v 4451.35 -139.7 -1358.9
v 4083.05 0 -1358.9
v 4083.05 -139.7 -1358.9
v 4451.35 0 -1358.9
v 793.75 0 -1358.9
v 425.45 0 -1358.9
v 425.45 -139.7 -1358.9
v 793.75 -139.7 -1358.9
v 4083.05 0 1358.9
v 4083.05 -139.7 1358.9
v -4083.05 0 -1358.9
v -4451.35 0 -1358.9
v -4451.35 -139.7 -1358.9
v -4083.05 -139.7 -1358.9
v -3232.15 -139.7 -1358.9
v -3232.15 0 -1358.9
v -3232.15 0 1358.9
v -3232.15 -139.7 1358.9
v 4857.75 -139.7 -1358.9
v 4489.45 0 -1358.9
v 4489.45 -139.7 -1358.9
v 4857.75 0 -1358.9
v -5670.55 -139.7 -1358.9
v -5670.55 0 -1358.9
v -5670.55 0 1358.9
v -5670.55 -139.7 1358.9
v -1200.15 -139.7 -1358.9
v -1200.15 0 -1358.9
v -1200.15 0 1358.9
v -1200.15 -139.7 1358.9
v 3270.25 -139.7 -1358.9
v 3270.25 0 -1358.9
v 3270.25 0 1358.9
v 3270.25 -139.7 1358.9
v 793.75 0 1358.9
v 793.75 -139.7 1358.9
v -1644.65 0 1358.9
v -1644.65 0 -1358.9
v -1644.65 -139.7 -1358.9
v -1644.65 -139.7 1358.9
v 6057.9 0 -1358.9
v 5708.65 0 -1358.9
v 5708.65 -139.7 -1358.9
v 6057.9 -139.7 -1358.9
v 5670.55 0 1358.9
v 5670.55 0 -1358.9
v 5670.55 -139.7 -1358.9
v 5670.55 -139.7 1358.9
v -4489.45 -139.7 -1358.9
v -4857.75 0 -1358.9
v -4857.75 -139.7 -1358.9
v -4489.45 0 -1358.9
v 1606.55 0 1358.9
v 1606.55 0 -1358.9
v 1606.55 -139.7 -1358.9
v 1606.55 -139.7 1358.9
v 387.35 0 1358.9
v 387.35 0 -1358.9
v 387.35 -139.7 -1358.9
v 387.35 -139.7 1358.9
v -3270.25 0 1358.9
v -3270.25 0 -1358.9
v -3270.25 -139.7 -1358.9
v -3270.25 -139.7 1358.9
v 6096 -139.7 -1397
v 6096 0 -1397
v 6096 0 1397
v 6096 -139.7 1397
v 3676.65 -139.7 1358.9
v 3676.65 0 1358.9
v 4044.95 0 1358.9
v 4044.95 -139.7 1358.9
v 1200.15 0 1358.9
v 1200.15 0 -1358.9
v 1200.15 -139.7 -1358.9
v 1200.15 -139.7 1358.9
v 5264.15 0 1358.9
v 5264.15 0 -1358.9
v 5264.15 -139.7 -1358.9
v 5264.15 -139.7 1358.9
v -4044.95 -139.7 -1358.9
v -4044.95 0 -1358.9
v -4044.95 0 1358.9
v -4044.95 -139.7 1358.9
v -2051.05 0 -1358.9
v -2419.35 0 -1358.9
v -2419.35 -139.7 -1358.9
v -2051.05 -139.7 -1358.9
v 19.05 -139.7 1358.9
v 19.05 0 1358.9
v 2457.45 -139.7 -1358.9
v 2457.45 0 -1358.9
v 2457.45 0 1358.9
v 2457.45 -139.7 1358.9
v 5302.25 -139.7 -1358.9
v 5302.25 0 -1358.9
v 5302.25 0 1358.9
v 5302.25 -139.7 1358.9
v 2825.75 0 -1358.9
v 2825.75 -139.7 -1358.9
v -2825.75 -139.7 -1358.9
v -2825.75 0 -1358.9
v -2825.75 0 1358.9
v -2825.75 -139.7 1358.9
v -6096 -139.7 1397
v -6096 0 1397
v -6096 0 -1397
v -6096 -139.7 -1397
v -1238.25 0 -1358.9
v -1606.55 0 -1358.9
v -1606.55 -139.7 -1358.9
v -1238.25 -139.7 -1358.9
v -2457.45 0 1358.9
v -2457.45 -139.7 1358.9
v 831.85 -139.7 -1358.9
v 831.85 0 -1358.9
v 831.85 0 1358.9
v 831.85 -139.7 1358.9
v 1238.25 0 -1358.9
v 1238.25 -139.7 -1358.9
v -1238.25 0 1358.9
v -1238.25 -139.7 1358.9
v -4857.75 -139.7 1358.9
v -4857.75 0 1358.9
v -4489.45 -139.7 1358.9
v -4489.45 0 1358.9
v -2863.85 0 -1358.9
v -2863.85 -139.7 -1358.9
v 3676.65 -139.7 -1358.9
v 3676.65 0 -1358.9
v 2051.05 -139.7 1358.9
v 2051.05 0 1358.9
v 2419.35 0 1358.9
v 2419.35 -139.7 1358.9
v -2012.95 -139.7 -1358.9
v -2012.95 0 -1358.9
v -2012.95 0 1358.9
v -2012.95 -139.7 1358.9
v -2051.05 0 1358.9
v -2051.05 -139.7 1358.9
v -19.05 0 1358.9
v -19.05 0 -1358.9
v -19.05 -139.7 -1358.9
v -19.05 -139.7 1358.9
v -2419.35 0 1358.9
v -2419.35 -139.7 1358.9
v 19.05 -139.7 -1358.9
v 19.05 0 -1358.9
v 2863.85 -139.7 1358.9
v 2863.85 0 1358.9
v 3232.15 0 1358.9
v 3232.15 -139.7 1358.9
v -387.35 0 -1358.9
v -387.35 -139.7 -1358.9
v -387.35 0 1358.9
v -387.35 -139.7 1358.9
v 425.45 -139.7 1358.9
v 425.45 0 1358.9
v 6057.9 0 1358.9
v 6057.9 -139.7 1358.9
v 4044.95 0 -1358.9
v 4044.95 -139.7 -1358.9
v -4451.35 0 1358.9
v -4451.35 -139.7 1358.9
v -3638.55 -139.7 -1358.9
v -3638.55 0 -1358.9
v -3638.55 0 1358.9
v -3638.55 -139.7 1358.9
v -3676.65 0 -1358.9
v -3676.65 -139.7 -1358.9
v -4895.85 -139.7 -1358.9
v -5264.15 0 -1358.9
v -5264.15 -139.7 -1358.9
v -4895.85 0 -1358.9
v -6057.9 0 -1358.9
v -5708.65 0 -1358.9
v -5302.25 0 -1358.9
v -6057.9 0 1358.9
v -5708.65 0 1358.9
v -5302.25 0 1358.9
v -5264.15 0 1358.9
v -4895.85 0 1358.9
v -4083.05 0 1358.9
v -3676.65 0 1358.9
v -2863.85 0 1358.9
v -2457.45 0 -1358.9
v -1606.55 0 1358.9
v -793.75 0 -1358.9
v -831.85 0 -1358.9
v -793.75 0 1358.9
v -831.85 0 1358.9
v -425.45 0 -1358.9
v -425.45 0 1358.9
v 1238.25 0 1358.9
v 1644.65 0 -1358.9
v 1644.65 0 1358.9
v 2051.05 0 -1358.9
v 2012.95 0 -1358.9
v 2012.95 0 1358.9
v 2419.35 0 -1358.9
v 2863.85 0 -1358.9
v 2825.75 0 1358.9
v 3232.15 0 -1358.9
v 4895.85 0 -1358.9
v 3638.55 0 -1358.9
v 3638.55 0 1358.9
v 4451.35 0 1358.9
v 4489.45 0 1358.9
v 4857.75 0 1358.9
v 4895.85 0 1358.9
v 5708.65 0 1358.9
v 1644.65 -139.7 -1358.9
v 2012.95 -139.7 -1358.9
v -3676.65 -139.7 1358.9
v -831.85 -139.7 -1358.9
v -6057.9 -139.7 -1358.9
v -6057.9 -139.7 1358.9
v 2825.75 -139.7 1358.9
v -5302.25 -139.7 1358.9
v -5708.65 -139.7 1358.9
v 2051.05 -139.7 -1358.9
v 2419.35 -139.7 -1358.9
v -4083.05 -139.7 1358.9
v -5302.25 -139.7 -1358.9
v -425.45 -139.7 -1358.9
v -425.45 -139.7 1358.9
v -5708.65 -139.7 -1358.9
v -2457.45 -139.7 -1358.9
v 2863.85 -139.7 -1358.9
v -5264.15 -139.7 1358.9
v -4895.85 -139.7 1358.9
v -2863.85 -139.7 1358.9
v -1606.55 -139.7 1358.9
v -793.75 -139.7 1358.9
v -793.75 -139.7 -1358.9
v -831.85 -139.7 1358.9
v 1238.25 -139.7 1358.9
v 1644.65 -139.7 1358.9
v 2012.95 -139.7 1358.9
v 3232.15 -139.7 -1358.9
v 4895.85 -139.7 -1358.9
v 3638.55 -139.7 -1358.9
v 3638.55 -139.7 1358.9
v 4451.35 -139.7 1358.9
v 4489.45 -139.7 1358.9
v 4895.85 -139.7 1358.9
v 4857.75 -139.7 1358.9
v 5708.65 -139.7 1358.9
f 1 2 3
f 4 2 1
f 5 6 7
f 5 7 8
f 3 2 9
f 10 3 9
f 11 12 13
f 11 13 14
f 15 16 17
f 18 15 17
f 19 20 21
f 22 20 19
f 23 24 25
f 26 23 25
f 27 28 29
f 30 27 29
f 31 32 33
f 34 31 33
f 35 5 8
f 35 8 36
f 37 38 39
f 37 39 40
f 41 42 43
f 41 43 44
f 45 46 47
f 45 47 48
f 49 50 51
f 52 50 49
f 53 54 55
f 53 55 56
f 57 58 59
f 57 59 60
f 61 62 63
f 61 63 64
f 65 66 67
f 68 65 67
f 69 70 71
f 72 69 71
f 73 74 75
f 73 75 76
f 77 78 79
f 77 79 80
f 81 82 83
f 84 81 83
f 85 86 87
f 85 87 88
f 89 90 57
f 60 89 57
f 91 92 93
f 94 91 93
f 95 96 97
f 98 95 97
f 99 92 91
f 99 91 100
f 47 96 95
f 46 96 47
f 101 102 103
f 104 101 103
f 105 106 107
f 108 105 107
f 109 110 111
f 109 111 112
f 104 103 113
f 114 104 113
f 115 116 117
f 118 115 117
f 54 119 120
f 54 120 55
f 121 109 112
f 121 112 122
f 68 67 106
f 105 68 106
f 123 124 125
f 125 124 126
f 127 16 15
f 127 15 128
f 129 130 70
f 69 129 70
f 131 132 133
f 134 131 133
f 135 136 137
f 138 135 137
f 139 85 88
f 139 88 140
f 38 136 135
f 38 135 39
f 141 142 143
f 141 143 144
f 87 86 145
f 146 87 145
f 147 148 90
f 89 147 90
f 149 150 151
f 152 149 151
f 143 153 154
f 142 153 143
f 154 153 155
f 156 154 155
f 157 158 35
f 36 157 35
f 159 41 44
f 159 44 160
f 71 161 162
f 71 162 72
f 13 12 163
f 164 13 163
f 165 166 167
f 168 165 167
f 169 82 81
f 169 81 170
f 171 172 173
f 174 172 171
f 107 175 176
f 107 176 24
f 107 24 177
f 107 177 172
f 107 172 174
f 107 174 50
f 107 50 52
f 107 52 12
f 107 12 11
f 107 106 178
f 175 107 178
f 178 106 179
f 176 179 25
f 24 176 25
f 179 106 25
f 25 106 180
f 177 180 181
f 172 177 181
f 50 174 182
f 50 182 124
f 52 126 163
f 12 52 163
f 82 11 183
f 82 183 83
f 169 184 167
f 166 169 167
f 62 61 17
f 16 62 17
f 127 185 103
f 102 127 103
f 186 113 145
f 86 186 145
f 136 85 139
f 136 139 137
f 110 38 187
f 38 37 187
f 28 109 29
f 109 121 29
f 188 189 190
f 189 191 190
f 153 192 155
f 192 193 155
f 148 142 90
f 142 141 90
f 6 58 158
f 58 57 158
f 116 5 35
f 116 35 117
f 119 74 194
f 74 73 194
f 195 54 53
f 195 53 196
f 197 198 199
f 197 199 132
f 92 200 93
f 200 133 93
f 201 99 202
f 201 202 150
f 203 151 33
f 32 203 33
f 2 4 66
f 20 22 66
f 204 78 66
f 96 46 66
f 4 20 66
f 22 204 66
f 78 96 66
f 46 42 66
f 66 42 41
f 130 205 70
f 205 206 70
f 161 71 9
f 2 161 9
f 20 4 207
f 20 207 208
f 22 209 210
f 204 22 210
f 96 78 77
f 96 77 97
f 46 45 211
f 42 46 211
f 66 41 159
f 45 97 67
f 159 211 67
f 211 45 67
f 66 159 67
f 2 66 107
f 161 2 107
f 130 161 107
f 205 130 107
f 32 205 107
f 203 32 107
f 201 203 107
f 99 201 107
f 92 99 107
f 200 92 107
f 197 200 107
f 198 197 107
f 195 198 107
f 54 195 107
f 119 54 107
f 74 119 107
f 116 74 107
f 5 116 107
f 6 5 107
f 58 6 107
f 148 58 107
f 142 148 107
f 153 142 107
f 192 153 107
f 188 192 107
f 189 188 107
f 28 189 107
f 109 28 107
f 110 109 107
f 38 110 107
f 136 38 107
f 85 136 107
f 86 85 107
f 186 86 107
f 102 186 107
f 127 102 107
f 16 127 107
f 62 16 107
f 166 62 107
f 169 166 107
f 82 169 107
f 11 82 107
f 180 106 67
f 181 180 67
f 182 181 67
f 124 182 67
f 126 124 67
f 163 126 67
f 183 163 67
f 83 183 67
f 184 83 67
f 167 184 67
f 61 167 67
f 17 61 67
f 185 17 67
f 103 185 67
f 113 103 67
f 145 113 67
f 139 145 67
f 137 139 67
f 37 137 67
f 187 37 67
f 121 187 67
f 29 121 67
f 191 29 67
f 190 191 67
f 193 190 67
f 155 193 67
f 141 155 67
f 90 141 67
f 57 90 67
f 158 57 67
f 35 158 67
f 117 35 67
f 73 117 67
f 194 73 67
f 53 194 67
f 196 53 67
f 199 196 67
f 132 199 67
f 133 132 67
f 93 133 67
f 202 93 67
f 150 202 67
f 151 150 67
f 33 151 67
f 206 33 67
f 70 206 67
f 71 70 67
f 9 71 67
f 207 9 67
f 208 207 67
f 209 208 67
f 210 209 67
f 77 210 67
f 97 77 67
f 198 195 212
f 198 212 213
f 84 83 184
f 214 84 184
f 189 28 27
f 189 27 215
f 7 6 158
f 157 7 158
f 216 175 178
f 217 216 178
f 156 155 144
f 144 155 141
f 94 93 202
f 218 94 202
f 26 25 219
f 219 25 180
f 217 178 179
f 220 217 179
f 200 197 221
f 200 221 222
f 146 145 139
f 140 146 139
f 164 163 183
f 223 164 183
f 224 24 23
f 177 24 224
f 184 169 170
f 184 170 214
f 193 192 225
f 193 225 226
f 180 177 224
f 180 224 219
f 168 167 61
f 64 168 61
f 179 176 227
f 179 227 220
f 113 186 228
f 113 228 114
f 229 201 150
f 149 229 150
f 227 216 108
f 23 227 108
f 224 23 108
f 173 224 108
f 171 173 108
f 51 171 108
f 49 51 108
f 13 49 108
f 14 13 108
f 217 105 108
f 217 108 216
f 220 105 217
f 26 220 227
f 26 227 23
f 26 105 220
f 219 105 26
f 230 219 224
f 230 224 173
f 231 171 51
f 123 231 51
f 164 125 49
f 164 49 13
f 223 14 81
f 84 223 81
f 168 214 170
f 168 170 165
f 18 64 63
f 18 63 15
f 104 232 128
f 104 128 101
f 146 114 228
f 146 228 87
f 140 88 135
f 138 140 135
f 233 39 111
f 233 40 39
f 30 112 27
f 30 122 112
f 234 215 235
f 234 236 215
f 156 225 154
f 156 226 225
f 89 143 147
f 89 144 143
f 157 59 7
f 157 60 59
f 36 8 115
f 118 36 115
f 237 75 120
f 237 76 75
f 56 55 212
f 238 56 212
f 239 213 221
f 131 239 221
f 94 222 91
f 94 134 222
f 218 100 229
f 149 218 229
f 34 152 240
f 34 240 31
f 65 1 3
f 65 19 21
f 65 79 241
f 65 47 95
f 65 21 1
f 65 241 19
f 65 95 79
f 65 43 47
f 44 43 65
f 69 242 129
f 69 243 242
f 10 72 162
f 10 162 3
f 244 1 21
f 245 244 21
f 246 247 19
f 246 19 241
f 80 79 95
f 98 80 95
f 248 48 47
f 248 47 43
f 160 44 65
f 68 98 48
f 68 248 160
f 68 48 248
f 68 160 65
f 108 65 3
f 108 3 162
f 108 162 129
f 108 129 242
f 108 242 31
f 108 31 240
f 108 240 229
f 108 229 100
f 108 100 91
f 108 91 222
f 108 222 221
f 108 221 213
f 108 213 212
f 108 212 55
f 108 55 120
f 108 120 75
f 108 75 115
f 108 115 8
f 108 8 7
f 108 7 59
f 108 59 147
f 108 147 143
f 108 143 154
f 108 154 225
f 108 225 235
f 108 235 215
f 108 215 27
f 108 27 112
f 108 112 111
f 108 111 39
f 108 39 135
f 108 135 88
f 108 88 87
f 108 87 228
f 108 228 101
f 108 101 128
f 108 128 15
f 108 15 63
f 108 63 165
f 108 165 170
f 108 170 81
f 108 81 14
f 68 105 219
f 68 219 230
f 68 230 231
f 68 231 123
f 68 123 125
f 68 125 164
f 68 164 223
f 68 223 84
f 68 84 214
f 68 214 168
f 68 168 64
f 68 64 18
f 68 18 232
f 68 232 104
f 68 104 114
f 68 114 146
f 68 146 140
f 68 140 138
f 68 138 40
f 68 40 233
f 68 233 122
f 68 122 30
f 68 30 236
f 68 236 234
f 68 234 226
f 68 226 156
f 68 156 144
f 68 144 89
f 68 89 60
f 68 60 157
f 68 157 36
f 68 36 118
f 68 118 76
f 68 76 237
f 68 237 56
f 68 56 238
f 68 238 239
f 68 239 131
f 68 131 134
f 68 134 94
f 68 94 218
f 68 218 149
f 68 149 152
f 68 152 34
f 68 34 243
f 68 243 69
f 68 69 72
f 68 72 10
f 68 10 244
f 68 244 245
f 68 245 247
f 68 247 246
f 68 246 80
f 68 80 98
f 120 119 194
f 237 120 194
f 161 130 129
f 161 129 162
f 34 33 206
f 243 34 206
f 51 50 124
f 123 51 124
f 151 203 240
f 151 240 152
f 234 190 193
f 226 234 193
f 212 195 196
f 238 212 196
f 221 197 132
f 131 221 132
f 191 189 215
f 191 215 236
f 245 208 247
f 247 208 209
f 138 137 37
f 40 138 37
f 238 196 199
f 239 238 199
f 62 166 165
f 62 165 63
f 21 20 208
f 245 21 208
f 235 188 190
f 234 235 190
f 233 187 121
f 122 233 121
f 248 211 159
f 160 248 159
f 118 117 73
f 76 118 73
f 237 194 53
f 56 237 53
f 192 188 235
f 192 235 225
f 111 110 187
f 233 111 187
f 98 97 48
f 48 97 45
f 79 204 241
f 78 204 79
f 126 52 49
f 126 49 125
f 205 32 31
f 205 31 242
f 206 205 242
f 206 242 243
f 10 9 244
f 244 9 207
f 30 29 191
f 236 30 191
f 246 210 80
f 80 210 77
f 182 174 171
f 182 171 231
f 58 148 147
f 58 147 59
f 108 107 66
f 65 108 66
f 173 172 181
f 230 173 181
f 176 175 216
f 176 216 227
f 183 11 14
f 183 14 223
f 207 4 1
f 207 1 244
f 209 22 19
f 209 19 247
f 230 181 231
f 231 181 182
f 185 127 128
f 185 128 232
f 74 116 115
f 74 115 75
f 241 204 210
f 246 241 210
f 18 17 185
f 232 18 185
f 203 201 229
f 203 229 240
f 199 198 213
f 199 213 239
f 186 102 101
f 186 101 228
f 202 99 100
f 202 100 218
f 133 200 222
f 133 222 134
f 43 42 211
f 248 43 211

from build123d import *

# Parameters (mm, degrees)
F0_W     = 349.25
F0_H     = 2717.8
F0_W_2   = 368.3
F1_DEPTH = 139.7


with BuildPart() as f1:
    # F0 (on Front) → F1 (new body)
    with BuildSketch(Plane.XZ):
        Polygon((-6096, 1397), (-6096, -1397), (-2863.85, -1397), (-2825.75, -1397), (6096, -1397), (6096, 1397), align=None)
        with Locations((-5883.275, 0)):
            Rectangle(F0_W, F0_H, mode=Mode.SUBTRACT)
        with Locations((-5486.4, 0)):
            Rectangle(F0_W_2, F0_H, mode=Mode.SUBTRACT)
        with Locations((-5080, 0)):
            Rectangle(F0_W_2, F0_H, mode=Mode.SUBTRACT)
        with Locations((-4673.6, 0)):
            Rectangle(F0_W_2, F0_H, mode=Mode.SUBTRACT)
        with Locations((-4267.2, 0)):
            Rectangle(F0_W_2, F0_H, mode=Mode.SUBTRACT)
        with Locations((-3860.8, 0)):
            Rectangle(F0_W_2, F0_H, mode=Mode.SUBTRACT)
        with Locations((-3454.4, 0)):
            Rectangle(F0_W_2, F0_H, mode=Mode.SUBTRACT)
        with Locations((-3048, 0)):
            Rectangle(F0_W_2, F0_H, mode=Mode.SUBTRACT)
        with Locations((-2641.6, 0)):
            Rectangle(F0_W_2, F0_H, mode=Mode.SUBTRACT)
        with Locations((-2235.2, 0)):
            Rectangle(F0_W_2, F0_H, mode=Mode.SUBTRACT)
        with Locations((-1828.8, 0)):
            Rectangle(F0_W_2, F0_H, mode=Mode.SUBTRACT)
        with Locations((-1422.4, 0)):
            Rectangle(F0_W_2, F0_H, mode=Mode.SUBTRACT)
        with Locations((-1016, 0)):
            Rectangle(F0_W_2, F0_H, mode=Mode.SUBTRACT)
        with Locations((-609.6, 0)):
            Rectangle(F0_W_2, F0_H, mode=Mode.SUBTRACT)
        with Locations((-203.2, 0)):
            Rectangle(F0_W_2, F0_H, mode=Mode.SUBTRACT)
        with Locations((203.2, 0)):
            Rectangle(F0_W_2, F0_H, mode=Mode.SUBTRACT)
        with Locations((609.6, 0)):
            Rectangle(F0_W_2, F0_H, mode=Mode.SUBTRACT)
        with Locations((1016, 0)):
            Rectangle(F0_W_2, F0_H, mode=Mode.SUBTRACT)
        with Locations((1422.4, 0)):
            Rectangle(F0_W_2, F0_H, mode=Mode.SUBTRACT)
        with Locations((1828.8, 0)):
            Rectangle(F0_W_2, F0_H, mode=Mode.SUBTRACT)
        with Locations((2235.2, 0)):
            Rectangle(F0_W_2, F0_H, mode=Mode.SUBTRACT)
        with Locations((2641.6, 0)):
            Rectangle(F0_W_2, F0_H, mode=Mode.SUBTRACT)
        with Locations((3048, 0)):
            Rectangle(F0_W_2, F0_H, mode=Mode.SUBTRACT)
        with Locations((3454.4, 0)):
            Rectangle(F0_W_2, F0_H, mode=Mode.SUBTRACT)
        with Locations((3860.8, 0)):
            Rectangle(F0_W_2, F0_H, mode=Mode.SUBTRACT)
        with Locations((4267.2, 0)):
            Rectangle(F0_W_2, F0_H, mode=Mode.SUBTRACT)
        with Locations((4673.6, 0)):
            Rectangle(F0_W_2, F0_H, mode=Mode.SUBTRACT)
        with Locations((5080, 0)):
            Rectangle(F0_W_2, F0_H, mode=Mode.SUBTRACT)
        with Locations((5486.4, 0)):
            Rectangle(F0_W_2, F0_H, mode=Mode.SUBTRACT)
        with Locations((5883.275, 0)):
            Rectangle(F0_W, F0_H, mode=Mode.SUBTRACT)
    extrude(amount=F1_DEPTH)


solid = f1.part
